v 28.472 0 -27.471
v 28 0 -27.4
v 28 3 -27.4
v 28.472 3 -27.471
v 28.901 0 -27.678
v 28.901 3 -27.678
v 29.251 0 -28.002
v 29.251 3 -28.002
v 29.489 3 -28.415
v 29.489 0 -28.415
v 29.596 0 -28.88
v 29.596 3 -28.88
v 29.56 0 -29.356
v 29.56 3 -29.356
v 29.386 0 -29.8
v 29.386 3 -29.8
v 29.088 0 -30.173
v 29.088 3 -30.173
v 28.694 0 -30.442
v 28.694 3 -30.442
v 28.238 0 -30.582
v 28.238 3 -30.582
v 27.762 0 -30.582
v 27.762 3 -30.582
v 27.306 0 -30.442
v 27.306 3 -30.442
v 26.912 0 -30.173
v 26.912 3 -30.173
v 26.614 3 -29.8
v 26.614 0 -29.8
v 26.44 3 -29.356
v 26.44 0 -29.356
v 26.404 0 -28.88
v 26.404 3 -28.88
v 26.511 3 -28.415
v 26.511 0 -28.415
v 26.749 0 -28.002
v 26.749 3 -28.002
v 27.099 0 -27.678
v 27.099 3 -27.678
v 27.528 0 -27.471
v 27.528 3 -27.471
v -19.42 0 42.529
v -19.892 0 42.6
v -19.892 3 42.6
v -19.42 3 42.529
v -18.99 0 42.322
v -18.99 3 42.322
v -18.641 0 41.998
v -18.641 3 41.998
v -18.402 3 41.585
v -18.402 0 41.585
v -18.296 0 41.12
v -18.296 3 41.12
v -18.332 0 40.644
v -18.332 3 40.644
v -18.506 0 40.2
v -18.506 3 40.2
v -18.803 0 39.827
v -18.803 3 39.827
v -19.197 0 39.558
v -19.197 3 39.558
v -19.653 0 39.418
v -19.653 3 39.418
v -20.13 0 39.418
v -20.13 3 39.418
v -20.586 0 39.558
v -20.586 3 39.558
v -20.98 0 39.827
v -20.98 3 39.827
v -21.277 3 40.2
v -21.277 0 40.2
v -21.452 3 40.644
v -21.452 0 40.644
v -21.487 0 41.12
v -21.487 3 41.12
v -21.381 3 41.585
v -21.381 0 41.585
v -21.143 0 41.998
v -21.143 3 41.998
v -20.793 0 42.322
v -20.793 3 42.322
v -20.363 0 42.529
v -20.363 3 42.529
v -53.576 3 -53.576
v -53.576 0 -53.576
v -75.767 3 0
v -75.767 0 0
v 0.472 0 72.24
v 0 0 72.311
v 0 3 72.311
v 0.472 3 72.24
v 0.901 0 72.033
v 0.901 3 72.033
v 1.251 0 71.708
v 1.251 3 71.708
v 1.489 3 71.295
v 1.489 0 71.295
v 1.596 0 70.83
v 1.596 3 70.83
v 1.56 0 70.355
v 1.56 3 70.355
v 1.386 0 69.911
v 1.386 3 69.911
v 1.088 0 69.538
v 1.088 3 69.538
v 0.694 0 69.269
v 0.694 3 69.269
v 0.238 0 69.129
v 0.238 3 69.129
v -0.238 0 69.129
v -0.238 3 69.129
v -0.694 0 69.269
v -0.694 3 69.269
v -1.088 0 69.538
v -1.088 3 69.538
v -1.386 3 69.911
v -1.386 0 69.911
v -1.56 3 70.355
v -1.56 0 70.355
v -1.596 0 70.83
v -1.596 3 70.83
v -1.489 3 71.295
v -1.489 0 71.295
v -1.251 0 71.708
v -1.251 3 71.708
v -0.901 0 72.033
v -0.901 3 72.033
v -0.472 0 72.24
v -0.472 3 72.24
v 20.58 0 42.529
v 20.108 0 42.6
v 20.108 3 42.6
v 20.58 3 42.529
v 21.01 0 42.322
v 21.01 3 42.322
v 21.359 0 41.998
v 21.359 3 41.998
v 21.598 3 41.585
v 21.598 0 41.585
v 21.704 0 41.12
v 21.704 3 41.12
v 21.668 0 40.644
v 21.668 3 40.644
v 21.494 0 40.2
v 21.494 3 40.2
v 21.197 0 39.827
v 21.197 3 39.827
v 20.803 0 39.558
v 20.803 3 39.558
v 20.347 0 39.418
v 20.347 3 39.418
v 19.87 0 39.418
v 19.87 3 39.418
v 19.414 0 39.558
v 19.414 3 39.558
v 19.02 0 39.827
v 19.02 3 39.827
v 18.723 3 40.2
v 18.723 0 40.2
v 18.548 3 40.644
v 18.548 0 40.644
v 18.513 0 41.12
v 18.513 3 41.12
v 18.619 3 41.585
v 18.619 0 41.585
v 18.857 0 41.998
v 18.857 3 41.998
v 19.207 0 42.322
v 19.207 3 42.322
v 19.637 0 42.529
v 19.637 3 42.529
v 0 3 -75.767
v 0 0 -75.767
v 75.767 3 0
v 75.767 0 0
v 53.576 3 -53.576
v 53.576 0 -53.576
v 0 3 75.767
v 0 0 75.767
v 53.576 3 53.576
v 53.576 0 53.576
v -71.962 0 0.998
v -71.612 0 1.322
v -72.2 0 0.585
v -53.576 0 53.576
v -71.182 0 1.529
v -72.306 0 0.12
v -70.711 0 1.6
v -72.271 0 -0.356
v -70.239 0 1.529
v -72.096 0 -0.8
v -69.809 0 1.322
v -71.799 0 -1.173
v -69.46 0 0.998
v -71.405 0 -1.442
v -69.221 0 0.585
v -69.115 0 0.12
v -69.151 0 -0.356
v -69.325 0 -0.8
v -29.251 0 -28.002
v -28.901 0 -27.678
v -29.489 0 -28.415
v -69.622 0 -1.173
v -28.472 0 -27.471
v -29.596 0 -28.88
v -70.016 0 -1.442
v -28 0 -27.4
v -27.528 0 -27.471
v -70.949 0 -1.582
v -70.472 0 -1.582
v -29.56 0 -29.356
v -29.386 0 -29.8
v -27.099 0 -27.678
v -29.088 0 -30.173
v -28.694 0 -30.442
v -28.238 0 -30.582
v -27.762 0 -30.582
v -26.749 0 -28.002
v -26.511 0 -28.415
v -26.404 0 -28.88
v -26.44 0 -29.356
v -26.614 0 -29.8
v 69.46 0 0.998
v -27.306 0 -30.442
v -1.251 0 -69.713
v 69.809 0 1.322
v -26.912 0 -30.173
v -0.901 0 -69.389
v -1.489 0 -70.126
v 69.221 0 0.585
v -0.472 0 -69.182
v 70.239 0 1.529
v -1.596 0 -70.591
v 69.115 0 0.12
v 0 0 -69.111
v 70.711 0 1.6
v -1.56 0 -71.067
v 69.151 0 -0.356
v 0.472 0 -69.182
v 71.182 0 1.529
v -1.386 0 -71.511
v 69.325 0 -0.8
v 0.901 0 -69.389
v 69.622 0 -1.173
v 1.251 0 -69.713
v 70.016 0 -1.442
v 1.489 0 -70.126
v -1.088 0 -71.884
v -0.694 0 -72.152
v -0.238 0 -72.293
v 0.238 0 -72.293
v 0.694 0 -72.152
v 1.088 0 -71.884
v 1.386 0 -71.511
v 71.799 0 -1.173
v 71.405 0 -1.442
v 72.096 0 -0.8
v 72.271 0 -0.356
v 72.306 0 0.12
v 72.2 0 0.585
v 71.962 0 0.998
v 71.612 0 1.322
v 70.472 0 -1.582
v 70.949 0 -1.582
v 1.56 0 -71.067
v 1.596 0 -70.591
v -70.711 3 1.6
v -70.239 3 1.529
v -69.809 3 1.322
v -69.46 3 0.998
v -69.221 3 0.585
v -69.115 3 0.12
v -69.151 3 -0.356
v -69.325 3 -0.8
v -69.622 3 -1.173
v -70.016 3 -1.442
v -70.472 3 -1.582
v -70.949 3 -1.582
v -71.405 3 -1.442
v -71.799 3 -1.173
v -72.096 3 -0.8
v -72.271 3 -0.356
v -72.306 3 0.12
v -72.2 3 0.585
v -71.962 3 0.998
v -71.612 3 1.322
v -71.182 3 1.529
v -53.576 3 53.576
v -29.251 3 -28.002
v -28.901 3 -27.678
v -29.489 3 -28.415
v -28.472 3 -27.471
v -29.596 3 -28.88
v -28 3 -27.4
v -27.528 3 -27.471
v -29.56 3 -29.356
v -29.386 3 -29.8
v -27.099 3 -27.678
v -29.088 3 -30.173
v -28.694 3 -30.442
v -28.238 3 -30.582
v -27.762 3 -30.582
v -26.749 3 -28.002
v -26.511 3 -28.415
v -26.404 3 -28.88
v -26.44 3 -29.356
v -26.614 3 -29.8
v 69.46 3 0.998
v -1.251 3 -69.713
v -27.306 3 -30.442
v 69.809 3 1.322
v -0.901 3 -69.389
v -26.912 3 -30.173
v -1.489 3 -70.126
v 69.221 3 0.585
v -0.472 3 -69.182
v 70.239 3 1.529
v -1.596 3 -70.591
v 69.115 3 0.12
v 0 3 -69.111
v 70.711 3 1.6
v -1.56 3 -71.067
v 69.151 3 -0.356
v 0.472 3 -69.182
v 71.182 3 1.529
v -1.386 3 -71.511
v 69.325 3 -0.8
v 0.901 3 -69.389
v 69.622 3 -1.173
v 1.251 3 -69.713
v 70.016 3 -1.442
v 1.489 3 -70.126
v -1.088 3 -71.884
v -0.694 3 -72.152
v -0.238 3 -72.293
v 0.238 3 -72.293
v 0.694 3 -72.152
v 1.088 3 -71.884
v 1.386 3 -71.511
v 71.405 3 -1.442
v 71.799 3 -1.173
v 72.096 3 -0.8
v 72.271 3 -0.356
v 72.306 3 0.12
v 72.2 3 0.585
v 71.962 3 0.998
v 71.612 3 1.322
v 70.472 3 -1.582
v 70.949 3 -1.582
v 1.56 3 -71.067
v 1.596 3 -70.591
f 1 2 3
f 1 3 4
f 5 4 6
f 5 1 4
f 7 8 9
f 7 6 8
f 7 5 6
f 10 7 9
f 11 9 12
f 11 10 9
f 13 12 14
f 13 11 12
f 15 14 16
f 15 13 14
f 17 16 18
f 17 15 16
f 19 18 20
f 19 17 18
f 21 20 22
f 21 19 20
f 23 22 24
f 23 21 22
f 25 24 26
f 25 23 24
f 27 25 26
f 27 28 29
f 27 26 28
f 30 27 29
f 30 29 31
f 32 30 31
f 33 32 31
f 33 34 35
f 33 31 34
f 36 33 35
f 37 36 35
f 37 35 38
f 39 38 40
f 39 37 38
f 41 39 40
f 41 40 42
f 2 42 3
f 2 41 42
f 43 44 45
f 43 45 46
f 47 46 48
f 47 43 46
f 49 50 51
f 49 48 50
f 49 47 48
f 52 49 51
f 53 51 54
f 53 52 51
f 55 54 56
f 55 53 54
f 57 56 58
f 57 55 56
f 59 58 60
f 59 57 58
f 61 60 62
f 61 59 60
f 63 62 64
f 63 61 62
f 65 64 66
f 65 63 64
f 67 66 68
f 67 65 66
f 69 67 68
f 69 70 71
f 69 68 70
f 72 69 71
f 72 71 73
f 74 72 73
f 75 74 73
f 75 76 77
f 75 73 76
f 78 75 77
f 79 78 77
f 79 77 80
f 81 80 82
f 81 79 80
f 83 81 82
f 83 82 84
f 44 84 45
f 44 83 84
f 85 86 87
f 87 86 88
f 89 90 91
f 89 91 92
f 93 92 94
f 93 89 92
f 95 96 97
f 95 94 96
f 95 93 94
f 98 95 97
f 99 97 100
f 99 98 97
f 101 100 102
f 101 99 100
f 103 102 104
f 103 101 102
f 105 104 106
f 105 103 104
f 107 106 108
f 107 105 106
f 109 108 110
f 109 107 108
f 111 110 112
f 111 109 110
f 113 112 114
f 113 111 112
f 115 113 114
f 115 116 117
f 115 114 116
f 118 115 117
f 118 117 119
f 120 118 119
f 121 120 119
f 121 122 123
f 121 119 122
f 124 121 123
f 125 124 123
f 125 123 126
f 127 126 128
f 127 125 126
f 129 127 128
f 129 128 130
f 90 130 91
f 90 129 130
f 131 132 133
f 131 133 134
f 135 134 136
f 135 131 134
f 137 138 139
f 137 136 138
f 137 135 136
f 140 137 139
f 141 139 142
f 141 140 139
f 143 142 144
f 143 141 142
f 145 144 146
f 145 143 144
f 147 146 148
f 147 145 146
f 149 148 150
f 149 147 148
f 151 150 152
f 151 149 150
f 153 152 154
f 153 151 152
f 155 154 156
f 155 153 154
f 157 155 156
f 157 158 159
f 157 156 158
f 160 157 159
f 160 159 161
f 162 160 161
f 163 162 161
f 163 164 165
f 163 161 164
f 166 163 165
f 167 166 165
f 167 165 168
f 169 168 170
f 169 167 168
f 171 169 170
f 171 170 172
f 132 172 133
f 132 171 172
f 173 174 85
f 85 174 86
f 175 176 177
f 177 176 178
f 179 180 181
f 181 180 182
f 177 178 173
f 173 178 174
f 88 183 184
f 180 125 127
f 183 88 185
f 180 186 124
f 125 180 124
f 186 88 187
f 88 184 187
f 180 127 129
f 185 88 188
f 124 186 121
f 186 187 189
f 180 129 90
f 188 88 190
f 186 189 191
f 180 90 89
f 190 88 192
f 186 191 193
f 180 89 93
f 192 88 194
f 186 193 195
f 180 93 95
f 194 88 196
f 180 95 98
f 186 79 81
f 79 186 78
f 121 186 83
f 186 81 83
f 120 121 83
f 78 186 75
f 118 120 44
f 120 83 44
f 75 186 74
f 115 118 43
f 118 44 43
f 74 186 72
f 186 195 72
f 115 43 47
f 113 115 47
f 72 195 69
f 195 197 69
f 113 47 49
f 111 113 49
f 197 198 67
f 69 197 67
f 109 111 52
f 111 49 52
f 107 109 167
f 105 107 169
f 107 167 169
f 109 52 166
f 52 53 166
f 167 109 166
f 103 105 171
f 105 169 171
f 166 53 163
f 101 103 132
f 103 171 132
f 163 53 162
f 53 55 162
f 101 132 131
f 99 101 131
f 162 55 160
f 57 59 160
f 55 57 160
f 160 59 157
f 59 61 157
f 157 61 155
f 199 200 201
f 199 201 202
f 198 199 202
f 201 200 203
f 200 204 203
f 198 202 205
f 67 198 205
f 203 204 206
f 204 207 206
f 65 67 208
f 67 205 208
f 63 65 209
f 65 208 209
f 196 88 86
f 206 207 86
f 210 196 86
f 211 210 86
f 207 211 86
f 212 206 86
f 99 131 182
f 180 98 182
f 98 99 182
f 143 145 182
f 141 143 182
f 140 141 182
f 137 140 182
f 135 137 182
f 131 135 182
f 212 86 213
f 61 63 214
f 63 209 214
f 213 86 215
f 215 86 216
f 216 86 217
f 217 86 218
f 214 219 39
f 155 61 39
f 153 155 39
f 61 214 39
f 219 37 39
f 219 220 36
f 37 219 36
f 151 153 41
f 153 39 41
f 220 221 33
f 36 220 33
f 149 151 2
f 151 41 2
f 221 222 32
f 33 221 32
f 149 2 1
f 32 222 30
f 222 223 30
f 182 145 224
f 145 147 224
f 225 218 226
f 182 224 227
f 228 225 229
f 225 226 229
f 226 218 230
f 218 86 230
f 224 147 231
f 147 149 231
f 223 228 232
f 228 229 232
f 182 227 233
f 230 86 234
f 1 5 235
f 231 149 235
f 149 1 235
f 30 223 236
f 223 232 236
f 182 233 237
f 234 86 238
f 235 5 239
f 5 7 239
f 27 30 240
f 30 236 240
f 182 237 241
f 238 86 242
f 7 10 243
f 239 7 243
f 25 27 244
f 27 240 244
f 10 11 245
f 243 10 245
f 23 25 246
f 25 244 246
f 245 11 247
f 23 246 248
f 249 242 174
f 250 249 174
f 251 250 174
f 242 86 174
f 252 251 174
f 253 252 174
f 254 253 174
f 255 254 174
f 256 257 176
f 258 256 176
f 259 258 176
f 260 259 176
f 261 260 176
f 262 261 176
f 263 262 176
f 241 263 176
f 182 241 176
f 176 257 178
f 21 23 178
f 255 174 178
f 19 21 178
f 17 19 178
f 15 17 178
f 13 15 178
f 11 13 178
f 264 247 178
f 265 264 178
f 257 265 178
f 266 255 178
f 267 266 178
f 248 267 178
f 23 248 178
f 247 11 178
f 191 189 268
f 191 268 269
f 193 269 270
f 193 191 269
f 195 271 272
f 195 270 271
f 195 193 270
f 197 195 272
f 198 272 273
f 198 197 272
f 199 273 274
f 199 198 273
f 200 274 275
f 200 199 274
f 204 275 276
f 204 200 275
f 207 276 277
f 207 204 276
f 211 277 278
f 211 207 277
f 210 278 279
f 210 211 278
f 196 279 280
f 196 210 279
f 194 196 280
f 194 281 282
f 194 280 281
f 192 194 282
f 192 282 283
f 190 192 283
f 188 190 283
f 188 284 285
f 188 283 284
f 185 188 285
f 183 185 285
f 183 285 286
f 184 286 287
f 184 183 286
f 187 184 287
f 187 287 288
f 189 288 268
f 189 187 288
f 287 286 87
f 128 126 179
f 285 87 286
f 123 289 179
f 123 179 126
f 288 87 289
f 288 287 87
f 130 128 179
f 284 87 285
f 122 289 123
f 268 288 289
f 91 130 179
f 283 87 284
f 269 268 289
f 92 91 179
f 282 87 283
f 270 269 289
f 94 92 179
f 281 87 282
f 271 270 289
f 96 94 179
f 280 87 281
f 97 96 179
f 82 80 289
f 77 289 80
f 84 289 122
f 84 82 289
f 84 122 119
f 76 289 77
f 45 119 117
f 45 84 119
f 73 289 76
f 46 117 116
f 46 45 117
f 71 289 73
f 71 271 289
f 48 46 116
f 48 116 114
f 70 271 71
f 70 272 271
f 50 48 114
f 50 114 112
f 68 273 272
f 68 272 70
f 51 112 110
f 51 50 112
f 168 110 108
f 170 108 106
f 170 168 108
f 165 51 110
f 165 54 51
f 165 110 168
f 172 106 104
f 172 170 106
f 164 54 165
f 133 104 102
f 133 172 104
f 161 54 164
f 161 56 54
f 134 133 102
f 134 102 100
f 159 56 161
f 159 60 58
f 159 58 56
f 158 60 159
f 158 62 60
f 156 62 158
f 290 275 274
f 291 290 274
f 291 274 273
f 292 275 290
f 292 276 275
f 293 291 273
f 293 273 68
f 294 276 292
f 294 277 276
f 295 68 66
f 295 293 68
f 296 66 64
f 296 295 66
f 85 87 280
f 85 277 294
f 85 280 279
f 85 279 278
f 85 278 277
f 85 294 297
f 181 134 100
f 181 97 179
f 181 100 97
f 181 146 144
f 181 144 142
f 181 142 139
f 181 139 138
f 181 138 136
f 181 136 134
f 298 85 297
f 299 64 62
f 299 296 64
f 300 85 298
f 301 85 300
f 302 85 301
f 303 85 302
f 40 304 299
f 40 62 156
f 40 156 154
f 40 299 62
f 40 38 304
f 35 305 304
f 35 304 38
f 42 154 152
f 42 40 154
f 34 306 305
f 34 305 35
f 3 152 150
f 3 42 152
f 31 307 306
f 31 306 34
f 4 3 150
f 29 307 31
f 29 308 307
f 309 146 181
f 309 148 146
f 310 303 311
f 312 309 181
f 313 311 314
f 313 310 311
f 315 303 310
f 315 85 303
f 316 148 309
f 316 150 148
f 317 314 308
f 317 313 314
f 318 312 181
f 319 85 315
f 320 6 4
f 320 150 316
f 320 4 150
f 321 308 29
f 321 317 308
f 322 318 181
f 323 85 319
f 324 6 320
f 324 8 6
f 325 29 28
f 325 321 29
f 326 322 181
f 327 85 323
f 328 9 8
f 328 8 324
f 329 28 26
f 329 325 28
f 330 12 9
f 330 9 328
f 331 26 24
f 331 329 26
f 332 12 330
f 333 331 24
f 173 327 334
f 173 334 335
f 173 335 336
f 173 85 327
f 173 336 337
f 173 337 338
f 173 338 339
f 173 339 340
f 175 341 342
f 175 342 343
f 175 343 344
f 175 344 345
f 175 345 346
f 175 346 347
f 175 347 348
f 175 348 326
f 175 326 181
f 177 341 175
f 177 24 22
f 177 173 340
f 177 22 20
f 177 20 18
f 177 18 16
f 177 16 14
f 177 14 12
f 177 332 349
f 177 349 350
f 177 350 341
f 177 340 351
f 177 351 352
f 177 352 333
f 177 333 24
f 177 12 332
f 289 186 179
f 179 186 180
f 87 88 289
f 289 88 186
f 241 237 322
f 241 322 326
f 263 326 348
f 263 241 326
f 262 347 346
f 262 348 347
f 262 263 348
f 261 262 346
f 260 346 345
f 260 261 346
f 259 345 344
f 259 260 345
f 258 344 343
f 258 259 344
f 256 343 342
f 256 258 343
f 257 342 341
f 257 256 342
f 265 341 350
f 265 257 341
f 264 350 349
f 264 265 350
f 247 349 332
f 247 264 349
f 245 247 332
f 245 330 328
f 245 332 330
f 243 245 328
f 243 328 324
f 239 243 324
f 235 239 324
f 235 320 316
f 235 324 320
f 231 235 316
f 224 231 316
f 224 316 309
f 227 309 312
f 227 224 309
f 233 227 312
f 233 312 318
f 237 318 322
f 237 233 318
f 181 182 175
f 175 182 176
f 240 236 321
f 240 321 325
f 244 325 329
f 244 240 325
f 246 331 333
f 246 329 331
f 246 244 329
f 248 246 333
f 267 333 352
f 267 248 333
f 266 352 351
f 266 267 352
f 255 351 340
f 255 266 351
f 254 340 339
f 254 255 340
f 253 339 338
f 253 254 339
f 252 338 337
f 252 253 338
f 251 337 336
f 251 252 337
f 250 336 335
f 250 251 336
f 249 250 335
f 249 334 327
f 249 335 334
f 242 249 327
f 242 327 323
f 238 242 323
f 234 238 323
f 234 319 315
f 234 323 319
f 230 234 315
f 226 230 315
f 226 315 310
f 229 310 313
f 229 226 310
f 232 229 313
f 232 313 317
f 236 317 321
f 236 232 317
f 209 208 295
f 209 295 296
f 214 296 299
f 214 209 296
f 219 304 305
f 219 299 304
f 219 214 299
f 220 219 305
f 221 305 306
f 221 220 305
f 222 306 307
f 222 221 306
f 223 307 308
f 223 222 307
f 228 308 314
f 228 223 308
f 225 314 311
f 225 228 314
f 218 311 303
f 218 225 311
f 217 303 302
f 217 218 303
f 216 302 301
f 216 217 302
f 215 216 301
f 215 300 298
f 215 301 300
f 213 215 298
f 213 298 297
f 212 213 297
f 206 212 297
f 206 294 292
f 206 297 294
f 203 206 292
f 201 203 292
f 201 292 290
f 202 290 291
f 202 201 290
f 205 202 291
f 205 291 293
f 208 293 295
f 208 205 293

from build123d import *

# Parameters (mm, degrees)
BOSS_EXTRUDE2_DEPTH     = 3
CUT_EXTRUDE3_DEPTH      = 108.193349502
CUT_EXTRUDE3_DEPTH_BACK = 108.193349502
SKETCH3_R               = 1.6
CUT_EXTRUDE4_DEPTH      = 108.193349502
CUT_EXTRUDE4_DEPTH_BACK = 108.193349502
SKETCH4_R               = 1.6


with BuildPart() as part:
    # Sketch1 → Boss-Extrude2 (new body)
    with BuildSketch(Plane(origin=(0, 0, 0), x_dir=(1, 0, 0), z_dir=(0, 1, 0))):
        Polygon((0, -75.76745402), (53.575680531, -53.575680531), (75.76745402, 0), (53.575680531, 53.575680531), (0, 75.76745402), (-53.575680531, 53.575680531), (-75.76745402, 0), (-53.575680531, -53.575680531), align=None)
    extrude(amount=BOSS_EXTRUDE2_DEPTH)

    # Sketch3 → Cut-Extrude3 (cut, two sides: drawn at the far end of the back side and taken through both)
    with BuildSketch(Plane(origin=(0, 3, 0), x_dir=(1, 0, 0), z_dir=(0, 1, 0)).offset(-CUT_EXTRUDE3_DEPTH_BACK)):
        with Locations(Location((-70.710678119, 0, 0), (0, 0, 270))):
            Circle(SKETCH3_R)
        with Locations(Location((0, 70.710678119, 0), (0, 0, 270))):
            Circle(SKETCH3_R)
        with Locations(Location((70.710678119, 0, 0), (0, 0, 270))):
            Circle(SKETCH3_R)
        with Locations(Location((0, -70.710678119, 0), (0, 0, 270))):
            Circle(SKETCH3_R)
    extrude(amount=CUT_EXTRUDE3_DEPTH + CUT_EXTRUDE3_DEPTH_BACK, mode=Mode.SUBTRACT)

    # Sketch4 → Cut-Extrude4 (cut, two sides: drawn at the far end of the back side and taken through both)
    with BuildSketch(Plane(origin=(0, 3, 0), x_dir=(1, 0, 0), z_dir=(0, 1, 0)).offset(-CUT_EXTRUDE4_DEPTH_BACK)):
        with Locations(Location((-19.891628757, -41, 0), (0, 0, 270))):
            Circle(SKETCH4_R)
        with Locations(Location((20.108371243, -41, 0), (0, 0, 270))):
            Circle(SKETCH4_R)
        with Locations(Location((-28, 29, 0), (0, 0, 270))):
            Circle(SKETCH4_R)
        with Locations(Location((28, 29, 0), (0, 0, 270))):
            Circle(SKETCH4_R)
    extrude(amount=CUT_EXTRUDE4_DEPTH + CUT_EXTRUDE4_DEPTH_BACK, mode=Mode.SUBTRACT)


solid = part.part
